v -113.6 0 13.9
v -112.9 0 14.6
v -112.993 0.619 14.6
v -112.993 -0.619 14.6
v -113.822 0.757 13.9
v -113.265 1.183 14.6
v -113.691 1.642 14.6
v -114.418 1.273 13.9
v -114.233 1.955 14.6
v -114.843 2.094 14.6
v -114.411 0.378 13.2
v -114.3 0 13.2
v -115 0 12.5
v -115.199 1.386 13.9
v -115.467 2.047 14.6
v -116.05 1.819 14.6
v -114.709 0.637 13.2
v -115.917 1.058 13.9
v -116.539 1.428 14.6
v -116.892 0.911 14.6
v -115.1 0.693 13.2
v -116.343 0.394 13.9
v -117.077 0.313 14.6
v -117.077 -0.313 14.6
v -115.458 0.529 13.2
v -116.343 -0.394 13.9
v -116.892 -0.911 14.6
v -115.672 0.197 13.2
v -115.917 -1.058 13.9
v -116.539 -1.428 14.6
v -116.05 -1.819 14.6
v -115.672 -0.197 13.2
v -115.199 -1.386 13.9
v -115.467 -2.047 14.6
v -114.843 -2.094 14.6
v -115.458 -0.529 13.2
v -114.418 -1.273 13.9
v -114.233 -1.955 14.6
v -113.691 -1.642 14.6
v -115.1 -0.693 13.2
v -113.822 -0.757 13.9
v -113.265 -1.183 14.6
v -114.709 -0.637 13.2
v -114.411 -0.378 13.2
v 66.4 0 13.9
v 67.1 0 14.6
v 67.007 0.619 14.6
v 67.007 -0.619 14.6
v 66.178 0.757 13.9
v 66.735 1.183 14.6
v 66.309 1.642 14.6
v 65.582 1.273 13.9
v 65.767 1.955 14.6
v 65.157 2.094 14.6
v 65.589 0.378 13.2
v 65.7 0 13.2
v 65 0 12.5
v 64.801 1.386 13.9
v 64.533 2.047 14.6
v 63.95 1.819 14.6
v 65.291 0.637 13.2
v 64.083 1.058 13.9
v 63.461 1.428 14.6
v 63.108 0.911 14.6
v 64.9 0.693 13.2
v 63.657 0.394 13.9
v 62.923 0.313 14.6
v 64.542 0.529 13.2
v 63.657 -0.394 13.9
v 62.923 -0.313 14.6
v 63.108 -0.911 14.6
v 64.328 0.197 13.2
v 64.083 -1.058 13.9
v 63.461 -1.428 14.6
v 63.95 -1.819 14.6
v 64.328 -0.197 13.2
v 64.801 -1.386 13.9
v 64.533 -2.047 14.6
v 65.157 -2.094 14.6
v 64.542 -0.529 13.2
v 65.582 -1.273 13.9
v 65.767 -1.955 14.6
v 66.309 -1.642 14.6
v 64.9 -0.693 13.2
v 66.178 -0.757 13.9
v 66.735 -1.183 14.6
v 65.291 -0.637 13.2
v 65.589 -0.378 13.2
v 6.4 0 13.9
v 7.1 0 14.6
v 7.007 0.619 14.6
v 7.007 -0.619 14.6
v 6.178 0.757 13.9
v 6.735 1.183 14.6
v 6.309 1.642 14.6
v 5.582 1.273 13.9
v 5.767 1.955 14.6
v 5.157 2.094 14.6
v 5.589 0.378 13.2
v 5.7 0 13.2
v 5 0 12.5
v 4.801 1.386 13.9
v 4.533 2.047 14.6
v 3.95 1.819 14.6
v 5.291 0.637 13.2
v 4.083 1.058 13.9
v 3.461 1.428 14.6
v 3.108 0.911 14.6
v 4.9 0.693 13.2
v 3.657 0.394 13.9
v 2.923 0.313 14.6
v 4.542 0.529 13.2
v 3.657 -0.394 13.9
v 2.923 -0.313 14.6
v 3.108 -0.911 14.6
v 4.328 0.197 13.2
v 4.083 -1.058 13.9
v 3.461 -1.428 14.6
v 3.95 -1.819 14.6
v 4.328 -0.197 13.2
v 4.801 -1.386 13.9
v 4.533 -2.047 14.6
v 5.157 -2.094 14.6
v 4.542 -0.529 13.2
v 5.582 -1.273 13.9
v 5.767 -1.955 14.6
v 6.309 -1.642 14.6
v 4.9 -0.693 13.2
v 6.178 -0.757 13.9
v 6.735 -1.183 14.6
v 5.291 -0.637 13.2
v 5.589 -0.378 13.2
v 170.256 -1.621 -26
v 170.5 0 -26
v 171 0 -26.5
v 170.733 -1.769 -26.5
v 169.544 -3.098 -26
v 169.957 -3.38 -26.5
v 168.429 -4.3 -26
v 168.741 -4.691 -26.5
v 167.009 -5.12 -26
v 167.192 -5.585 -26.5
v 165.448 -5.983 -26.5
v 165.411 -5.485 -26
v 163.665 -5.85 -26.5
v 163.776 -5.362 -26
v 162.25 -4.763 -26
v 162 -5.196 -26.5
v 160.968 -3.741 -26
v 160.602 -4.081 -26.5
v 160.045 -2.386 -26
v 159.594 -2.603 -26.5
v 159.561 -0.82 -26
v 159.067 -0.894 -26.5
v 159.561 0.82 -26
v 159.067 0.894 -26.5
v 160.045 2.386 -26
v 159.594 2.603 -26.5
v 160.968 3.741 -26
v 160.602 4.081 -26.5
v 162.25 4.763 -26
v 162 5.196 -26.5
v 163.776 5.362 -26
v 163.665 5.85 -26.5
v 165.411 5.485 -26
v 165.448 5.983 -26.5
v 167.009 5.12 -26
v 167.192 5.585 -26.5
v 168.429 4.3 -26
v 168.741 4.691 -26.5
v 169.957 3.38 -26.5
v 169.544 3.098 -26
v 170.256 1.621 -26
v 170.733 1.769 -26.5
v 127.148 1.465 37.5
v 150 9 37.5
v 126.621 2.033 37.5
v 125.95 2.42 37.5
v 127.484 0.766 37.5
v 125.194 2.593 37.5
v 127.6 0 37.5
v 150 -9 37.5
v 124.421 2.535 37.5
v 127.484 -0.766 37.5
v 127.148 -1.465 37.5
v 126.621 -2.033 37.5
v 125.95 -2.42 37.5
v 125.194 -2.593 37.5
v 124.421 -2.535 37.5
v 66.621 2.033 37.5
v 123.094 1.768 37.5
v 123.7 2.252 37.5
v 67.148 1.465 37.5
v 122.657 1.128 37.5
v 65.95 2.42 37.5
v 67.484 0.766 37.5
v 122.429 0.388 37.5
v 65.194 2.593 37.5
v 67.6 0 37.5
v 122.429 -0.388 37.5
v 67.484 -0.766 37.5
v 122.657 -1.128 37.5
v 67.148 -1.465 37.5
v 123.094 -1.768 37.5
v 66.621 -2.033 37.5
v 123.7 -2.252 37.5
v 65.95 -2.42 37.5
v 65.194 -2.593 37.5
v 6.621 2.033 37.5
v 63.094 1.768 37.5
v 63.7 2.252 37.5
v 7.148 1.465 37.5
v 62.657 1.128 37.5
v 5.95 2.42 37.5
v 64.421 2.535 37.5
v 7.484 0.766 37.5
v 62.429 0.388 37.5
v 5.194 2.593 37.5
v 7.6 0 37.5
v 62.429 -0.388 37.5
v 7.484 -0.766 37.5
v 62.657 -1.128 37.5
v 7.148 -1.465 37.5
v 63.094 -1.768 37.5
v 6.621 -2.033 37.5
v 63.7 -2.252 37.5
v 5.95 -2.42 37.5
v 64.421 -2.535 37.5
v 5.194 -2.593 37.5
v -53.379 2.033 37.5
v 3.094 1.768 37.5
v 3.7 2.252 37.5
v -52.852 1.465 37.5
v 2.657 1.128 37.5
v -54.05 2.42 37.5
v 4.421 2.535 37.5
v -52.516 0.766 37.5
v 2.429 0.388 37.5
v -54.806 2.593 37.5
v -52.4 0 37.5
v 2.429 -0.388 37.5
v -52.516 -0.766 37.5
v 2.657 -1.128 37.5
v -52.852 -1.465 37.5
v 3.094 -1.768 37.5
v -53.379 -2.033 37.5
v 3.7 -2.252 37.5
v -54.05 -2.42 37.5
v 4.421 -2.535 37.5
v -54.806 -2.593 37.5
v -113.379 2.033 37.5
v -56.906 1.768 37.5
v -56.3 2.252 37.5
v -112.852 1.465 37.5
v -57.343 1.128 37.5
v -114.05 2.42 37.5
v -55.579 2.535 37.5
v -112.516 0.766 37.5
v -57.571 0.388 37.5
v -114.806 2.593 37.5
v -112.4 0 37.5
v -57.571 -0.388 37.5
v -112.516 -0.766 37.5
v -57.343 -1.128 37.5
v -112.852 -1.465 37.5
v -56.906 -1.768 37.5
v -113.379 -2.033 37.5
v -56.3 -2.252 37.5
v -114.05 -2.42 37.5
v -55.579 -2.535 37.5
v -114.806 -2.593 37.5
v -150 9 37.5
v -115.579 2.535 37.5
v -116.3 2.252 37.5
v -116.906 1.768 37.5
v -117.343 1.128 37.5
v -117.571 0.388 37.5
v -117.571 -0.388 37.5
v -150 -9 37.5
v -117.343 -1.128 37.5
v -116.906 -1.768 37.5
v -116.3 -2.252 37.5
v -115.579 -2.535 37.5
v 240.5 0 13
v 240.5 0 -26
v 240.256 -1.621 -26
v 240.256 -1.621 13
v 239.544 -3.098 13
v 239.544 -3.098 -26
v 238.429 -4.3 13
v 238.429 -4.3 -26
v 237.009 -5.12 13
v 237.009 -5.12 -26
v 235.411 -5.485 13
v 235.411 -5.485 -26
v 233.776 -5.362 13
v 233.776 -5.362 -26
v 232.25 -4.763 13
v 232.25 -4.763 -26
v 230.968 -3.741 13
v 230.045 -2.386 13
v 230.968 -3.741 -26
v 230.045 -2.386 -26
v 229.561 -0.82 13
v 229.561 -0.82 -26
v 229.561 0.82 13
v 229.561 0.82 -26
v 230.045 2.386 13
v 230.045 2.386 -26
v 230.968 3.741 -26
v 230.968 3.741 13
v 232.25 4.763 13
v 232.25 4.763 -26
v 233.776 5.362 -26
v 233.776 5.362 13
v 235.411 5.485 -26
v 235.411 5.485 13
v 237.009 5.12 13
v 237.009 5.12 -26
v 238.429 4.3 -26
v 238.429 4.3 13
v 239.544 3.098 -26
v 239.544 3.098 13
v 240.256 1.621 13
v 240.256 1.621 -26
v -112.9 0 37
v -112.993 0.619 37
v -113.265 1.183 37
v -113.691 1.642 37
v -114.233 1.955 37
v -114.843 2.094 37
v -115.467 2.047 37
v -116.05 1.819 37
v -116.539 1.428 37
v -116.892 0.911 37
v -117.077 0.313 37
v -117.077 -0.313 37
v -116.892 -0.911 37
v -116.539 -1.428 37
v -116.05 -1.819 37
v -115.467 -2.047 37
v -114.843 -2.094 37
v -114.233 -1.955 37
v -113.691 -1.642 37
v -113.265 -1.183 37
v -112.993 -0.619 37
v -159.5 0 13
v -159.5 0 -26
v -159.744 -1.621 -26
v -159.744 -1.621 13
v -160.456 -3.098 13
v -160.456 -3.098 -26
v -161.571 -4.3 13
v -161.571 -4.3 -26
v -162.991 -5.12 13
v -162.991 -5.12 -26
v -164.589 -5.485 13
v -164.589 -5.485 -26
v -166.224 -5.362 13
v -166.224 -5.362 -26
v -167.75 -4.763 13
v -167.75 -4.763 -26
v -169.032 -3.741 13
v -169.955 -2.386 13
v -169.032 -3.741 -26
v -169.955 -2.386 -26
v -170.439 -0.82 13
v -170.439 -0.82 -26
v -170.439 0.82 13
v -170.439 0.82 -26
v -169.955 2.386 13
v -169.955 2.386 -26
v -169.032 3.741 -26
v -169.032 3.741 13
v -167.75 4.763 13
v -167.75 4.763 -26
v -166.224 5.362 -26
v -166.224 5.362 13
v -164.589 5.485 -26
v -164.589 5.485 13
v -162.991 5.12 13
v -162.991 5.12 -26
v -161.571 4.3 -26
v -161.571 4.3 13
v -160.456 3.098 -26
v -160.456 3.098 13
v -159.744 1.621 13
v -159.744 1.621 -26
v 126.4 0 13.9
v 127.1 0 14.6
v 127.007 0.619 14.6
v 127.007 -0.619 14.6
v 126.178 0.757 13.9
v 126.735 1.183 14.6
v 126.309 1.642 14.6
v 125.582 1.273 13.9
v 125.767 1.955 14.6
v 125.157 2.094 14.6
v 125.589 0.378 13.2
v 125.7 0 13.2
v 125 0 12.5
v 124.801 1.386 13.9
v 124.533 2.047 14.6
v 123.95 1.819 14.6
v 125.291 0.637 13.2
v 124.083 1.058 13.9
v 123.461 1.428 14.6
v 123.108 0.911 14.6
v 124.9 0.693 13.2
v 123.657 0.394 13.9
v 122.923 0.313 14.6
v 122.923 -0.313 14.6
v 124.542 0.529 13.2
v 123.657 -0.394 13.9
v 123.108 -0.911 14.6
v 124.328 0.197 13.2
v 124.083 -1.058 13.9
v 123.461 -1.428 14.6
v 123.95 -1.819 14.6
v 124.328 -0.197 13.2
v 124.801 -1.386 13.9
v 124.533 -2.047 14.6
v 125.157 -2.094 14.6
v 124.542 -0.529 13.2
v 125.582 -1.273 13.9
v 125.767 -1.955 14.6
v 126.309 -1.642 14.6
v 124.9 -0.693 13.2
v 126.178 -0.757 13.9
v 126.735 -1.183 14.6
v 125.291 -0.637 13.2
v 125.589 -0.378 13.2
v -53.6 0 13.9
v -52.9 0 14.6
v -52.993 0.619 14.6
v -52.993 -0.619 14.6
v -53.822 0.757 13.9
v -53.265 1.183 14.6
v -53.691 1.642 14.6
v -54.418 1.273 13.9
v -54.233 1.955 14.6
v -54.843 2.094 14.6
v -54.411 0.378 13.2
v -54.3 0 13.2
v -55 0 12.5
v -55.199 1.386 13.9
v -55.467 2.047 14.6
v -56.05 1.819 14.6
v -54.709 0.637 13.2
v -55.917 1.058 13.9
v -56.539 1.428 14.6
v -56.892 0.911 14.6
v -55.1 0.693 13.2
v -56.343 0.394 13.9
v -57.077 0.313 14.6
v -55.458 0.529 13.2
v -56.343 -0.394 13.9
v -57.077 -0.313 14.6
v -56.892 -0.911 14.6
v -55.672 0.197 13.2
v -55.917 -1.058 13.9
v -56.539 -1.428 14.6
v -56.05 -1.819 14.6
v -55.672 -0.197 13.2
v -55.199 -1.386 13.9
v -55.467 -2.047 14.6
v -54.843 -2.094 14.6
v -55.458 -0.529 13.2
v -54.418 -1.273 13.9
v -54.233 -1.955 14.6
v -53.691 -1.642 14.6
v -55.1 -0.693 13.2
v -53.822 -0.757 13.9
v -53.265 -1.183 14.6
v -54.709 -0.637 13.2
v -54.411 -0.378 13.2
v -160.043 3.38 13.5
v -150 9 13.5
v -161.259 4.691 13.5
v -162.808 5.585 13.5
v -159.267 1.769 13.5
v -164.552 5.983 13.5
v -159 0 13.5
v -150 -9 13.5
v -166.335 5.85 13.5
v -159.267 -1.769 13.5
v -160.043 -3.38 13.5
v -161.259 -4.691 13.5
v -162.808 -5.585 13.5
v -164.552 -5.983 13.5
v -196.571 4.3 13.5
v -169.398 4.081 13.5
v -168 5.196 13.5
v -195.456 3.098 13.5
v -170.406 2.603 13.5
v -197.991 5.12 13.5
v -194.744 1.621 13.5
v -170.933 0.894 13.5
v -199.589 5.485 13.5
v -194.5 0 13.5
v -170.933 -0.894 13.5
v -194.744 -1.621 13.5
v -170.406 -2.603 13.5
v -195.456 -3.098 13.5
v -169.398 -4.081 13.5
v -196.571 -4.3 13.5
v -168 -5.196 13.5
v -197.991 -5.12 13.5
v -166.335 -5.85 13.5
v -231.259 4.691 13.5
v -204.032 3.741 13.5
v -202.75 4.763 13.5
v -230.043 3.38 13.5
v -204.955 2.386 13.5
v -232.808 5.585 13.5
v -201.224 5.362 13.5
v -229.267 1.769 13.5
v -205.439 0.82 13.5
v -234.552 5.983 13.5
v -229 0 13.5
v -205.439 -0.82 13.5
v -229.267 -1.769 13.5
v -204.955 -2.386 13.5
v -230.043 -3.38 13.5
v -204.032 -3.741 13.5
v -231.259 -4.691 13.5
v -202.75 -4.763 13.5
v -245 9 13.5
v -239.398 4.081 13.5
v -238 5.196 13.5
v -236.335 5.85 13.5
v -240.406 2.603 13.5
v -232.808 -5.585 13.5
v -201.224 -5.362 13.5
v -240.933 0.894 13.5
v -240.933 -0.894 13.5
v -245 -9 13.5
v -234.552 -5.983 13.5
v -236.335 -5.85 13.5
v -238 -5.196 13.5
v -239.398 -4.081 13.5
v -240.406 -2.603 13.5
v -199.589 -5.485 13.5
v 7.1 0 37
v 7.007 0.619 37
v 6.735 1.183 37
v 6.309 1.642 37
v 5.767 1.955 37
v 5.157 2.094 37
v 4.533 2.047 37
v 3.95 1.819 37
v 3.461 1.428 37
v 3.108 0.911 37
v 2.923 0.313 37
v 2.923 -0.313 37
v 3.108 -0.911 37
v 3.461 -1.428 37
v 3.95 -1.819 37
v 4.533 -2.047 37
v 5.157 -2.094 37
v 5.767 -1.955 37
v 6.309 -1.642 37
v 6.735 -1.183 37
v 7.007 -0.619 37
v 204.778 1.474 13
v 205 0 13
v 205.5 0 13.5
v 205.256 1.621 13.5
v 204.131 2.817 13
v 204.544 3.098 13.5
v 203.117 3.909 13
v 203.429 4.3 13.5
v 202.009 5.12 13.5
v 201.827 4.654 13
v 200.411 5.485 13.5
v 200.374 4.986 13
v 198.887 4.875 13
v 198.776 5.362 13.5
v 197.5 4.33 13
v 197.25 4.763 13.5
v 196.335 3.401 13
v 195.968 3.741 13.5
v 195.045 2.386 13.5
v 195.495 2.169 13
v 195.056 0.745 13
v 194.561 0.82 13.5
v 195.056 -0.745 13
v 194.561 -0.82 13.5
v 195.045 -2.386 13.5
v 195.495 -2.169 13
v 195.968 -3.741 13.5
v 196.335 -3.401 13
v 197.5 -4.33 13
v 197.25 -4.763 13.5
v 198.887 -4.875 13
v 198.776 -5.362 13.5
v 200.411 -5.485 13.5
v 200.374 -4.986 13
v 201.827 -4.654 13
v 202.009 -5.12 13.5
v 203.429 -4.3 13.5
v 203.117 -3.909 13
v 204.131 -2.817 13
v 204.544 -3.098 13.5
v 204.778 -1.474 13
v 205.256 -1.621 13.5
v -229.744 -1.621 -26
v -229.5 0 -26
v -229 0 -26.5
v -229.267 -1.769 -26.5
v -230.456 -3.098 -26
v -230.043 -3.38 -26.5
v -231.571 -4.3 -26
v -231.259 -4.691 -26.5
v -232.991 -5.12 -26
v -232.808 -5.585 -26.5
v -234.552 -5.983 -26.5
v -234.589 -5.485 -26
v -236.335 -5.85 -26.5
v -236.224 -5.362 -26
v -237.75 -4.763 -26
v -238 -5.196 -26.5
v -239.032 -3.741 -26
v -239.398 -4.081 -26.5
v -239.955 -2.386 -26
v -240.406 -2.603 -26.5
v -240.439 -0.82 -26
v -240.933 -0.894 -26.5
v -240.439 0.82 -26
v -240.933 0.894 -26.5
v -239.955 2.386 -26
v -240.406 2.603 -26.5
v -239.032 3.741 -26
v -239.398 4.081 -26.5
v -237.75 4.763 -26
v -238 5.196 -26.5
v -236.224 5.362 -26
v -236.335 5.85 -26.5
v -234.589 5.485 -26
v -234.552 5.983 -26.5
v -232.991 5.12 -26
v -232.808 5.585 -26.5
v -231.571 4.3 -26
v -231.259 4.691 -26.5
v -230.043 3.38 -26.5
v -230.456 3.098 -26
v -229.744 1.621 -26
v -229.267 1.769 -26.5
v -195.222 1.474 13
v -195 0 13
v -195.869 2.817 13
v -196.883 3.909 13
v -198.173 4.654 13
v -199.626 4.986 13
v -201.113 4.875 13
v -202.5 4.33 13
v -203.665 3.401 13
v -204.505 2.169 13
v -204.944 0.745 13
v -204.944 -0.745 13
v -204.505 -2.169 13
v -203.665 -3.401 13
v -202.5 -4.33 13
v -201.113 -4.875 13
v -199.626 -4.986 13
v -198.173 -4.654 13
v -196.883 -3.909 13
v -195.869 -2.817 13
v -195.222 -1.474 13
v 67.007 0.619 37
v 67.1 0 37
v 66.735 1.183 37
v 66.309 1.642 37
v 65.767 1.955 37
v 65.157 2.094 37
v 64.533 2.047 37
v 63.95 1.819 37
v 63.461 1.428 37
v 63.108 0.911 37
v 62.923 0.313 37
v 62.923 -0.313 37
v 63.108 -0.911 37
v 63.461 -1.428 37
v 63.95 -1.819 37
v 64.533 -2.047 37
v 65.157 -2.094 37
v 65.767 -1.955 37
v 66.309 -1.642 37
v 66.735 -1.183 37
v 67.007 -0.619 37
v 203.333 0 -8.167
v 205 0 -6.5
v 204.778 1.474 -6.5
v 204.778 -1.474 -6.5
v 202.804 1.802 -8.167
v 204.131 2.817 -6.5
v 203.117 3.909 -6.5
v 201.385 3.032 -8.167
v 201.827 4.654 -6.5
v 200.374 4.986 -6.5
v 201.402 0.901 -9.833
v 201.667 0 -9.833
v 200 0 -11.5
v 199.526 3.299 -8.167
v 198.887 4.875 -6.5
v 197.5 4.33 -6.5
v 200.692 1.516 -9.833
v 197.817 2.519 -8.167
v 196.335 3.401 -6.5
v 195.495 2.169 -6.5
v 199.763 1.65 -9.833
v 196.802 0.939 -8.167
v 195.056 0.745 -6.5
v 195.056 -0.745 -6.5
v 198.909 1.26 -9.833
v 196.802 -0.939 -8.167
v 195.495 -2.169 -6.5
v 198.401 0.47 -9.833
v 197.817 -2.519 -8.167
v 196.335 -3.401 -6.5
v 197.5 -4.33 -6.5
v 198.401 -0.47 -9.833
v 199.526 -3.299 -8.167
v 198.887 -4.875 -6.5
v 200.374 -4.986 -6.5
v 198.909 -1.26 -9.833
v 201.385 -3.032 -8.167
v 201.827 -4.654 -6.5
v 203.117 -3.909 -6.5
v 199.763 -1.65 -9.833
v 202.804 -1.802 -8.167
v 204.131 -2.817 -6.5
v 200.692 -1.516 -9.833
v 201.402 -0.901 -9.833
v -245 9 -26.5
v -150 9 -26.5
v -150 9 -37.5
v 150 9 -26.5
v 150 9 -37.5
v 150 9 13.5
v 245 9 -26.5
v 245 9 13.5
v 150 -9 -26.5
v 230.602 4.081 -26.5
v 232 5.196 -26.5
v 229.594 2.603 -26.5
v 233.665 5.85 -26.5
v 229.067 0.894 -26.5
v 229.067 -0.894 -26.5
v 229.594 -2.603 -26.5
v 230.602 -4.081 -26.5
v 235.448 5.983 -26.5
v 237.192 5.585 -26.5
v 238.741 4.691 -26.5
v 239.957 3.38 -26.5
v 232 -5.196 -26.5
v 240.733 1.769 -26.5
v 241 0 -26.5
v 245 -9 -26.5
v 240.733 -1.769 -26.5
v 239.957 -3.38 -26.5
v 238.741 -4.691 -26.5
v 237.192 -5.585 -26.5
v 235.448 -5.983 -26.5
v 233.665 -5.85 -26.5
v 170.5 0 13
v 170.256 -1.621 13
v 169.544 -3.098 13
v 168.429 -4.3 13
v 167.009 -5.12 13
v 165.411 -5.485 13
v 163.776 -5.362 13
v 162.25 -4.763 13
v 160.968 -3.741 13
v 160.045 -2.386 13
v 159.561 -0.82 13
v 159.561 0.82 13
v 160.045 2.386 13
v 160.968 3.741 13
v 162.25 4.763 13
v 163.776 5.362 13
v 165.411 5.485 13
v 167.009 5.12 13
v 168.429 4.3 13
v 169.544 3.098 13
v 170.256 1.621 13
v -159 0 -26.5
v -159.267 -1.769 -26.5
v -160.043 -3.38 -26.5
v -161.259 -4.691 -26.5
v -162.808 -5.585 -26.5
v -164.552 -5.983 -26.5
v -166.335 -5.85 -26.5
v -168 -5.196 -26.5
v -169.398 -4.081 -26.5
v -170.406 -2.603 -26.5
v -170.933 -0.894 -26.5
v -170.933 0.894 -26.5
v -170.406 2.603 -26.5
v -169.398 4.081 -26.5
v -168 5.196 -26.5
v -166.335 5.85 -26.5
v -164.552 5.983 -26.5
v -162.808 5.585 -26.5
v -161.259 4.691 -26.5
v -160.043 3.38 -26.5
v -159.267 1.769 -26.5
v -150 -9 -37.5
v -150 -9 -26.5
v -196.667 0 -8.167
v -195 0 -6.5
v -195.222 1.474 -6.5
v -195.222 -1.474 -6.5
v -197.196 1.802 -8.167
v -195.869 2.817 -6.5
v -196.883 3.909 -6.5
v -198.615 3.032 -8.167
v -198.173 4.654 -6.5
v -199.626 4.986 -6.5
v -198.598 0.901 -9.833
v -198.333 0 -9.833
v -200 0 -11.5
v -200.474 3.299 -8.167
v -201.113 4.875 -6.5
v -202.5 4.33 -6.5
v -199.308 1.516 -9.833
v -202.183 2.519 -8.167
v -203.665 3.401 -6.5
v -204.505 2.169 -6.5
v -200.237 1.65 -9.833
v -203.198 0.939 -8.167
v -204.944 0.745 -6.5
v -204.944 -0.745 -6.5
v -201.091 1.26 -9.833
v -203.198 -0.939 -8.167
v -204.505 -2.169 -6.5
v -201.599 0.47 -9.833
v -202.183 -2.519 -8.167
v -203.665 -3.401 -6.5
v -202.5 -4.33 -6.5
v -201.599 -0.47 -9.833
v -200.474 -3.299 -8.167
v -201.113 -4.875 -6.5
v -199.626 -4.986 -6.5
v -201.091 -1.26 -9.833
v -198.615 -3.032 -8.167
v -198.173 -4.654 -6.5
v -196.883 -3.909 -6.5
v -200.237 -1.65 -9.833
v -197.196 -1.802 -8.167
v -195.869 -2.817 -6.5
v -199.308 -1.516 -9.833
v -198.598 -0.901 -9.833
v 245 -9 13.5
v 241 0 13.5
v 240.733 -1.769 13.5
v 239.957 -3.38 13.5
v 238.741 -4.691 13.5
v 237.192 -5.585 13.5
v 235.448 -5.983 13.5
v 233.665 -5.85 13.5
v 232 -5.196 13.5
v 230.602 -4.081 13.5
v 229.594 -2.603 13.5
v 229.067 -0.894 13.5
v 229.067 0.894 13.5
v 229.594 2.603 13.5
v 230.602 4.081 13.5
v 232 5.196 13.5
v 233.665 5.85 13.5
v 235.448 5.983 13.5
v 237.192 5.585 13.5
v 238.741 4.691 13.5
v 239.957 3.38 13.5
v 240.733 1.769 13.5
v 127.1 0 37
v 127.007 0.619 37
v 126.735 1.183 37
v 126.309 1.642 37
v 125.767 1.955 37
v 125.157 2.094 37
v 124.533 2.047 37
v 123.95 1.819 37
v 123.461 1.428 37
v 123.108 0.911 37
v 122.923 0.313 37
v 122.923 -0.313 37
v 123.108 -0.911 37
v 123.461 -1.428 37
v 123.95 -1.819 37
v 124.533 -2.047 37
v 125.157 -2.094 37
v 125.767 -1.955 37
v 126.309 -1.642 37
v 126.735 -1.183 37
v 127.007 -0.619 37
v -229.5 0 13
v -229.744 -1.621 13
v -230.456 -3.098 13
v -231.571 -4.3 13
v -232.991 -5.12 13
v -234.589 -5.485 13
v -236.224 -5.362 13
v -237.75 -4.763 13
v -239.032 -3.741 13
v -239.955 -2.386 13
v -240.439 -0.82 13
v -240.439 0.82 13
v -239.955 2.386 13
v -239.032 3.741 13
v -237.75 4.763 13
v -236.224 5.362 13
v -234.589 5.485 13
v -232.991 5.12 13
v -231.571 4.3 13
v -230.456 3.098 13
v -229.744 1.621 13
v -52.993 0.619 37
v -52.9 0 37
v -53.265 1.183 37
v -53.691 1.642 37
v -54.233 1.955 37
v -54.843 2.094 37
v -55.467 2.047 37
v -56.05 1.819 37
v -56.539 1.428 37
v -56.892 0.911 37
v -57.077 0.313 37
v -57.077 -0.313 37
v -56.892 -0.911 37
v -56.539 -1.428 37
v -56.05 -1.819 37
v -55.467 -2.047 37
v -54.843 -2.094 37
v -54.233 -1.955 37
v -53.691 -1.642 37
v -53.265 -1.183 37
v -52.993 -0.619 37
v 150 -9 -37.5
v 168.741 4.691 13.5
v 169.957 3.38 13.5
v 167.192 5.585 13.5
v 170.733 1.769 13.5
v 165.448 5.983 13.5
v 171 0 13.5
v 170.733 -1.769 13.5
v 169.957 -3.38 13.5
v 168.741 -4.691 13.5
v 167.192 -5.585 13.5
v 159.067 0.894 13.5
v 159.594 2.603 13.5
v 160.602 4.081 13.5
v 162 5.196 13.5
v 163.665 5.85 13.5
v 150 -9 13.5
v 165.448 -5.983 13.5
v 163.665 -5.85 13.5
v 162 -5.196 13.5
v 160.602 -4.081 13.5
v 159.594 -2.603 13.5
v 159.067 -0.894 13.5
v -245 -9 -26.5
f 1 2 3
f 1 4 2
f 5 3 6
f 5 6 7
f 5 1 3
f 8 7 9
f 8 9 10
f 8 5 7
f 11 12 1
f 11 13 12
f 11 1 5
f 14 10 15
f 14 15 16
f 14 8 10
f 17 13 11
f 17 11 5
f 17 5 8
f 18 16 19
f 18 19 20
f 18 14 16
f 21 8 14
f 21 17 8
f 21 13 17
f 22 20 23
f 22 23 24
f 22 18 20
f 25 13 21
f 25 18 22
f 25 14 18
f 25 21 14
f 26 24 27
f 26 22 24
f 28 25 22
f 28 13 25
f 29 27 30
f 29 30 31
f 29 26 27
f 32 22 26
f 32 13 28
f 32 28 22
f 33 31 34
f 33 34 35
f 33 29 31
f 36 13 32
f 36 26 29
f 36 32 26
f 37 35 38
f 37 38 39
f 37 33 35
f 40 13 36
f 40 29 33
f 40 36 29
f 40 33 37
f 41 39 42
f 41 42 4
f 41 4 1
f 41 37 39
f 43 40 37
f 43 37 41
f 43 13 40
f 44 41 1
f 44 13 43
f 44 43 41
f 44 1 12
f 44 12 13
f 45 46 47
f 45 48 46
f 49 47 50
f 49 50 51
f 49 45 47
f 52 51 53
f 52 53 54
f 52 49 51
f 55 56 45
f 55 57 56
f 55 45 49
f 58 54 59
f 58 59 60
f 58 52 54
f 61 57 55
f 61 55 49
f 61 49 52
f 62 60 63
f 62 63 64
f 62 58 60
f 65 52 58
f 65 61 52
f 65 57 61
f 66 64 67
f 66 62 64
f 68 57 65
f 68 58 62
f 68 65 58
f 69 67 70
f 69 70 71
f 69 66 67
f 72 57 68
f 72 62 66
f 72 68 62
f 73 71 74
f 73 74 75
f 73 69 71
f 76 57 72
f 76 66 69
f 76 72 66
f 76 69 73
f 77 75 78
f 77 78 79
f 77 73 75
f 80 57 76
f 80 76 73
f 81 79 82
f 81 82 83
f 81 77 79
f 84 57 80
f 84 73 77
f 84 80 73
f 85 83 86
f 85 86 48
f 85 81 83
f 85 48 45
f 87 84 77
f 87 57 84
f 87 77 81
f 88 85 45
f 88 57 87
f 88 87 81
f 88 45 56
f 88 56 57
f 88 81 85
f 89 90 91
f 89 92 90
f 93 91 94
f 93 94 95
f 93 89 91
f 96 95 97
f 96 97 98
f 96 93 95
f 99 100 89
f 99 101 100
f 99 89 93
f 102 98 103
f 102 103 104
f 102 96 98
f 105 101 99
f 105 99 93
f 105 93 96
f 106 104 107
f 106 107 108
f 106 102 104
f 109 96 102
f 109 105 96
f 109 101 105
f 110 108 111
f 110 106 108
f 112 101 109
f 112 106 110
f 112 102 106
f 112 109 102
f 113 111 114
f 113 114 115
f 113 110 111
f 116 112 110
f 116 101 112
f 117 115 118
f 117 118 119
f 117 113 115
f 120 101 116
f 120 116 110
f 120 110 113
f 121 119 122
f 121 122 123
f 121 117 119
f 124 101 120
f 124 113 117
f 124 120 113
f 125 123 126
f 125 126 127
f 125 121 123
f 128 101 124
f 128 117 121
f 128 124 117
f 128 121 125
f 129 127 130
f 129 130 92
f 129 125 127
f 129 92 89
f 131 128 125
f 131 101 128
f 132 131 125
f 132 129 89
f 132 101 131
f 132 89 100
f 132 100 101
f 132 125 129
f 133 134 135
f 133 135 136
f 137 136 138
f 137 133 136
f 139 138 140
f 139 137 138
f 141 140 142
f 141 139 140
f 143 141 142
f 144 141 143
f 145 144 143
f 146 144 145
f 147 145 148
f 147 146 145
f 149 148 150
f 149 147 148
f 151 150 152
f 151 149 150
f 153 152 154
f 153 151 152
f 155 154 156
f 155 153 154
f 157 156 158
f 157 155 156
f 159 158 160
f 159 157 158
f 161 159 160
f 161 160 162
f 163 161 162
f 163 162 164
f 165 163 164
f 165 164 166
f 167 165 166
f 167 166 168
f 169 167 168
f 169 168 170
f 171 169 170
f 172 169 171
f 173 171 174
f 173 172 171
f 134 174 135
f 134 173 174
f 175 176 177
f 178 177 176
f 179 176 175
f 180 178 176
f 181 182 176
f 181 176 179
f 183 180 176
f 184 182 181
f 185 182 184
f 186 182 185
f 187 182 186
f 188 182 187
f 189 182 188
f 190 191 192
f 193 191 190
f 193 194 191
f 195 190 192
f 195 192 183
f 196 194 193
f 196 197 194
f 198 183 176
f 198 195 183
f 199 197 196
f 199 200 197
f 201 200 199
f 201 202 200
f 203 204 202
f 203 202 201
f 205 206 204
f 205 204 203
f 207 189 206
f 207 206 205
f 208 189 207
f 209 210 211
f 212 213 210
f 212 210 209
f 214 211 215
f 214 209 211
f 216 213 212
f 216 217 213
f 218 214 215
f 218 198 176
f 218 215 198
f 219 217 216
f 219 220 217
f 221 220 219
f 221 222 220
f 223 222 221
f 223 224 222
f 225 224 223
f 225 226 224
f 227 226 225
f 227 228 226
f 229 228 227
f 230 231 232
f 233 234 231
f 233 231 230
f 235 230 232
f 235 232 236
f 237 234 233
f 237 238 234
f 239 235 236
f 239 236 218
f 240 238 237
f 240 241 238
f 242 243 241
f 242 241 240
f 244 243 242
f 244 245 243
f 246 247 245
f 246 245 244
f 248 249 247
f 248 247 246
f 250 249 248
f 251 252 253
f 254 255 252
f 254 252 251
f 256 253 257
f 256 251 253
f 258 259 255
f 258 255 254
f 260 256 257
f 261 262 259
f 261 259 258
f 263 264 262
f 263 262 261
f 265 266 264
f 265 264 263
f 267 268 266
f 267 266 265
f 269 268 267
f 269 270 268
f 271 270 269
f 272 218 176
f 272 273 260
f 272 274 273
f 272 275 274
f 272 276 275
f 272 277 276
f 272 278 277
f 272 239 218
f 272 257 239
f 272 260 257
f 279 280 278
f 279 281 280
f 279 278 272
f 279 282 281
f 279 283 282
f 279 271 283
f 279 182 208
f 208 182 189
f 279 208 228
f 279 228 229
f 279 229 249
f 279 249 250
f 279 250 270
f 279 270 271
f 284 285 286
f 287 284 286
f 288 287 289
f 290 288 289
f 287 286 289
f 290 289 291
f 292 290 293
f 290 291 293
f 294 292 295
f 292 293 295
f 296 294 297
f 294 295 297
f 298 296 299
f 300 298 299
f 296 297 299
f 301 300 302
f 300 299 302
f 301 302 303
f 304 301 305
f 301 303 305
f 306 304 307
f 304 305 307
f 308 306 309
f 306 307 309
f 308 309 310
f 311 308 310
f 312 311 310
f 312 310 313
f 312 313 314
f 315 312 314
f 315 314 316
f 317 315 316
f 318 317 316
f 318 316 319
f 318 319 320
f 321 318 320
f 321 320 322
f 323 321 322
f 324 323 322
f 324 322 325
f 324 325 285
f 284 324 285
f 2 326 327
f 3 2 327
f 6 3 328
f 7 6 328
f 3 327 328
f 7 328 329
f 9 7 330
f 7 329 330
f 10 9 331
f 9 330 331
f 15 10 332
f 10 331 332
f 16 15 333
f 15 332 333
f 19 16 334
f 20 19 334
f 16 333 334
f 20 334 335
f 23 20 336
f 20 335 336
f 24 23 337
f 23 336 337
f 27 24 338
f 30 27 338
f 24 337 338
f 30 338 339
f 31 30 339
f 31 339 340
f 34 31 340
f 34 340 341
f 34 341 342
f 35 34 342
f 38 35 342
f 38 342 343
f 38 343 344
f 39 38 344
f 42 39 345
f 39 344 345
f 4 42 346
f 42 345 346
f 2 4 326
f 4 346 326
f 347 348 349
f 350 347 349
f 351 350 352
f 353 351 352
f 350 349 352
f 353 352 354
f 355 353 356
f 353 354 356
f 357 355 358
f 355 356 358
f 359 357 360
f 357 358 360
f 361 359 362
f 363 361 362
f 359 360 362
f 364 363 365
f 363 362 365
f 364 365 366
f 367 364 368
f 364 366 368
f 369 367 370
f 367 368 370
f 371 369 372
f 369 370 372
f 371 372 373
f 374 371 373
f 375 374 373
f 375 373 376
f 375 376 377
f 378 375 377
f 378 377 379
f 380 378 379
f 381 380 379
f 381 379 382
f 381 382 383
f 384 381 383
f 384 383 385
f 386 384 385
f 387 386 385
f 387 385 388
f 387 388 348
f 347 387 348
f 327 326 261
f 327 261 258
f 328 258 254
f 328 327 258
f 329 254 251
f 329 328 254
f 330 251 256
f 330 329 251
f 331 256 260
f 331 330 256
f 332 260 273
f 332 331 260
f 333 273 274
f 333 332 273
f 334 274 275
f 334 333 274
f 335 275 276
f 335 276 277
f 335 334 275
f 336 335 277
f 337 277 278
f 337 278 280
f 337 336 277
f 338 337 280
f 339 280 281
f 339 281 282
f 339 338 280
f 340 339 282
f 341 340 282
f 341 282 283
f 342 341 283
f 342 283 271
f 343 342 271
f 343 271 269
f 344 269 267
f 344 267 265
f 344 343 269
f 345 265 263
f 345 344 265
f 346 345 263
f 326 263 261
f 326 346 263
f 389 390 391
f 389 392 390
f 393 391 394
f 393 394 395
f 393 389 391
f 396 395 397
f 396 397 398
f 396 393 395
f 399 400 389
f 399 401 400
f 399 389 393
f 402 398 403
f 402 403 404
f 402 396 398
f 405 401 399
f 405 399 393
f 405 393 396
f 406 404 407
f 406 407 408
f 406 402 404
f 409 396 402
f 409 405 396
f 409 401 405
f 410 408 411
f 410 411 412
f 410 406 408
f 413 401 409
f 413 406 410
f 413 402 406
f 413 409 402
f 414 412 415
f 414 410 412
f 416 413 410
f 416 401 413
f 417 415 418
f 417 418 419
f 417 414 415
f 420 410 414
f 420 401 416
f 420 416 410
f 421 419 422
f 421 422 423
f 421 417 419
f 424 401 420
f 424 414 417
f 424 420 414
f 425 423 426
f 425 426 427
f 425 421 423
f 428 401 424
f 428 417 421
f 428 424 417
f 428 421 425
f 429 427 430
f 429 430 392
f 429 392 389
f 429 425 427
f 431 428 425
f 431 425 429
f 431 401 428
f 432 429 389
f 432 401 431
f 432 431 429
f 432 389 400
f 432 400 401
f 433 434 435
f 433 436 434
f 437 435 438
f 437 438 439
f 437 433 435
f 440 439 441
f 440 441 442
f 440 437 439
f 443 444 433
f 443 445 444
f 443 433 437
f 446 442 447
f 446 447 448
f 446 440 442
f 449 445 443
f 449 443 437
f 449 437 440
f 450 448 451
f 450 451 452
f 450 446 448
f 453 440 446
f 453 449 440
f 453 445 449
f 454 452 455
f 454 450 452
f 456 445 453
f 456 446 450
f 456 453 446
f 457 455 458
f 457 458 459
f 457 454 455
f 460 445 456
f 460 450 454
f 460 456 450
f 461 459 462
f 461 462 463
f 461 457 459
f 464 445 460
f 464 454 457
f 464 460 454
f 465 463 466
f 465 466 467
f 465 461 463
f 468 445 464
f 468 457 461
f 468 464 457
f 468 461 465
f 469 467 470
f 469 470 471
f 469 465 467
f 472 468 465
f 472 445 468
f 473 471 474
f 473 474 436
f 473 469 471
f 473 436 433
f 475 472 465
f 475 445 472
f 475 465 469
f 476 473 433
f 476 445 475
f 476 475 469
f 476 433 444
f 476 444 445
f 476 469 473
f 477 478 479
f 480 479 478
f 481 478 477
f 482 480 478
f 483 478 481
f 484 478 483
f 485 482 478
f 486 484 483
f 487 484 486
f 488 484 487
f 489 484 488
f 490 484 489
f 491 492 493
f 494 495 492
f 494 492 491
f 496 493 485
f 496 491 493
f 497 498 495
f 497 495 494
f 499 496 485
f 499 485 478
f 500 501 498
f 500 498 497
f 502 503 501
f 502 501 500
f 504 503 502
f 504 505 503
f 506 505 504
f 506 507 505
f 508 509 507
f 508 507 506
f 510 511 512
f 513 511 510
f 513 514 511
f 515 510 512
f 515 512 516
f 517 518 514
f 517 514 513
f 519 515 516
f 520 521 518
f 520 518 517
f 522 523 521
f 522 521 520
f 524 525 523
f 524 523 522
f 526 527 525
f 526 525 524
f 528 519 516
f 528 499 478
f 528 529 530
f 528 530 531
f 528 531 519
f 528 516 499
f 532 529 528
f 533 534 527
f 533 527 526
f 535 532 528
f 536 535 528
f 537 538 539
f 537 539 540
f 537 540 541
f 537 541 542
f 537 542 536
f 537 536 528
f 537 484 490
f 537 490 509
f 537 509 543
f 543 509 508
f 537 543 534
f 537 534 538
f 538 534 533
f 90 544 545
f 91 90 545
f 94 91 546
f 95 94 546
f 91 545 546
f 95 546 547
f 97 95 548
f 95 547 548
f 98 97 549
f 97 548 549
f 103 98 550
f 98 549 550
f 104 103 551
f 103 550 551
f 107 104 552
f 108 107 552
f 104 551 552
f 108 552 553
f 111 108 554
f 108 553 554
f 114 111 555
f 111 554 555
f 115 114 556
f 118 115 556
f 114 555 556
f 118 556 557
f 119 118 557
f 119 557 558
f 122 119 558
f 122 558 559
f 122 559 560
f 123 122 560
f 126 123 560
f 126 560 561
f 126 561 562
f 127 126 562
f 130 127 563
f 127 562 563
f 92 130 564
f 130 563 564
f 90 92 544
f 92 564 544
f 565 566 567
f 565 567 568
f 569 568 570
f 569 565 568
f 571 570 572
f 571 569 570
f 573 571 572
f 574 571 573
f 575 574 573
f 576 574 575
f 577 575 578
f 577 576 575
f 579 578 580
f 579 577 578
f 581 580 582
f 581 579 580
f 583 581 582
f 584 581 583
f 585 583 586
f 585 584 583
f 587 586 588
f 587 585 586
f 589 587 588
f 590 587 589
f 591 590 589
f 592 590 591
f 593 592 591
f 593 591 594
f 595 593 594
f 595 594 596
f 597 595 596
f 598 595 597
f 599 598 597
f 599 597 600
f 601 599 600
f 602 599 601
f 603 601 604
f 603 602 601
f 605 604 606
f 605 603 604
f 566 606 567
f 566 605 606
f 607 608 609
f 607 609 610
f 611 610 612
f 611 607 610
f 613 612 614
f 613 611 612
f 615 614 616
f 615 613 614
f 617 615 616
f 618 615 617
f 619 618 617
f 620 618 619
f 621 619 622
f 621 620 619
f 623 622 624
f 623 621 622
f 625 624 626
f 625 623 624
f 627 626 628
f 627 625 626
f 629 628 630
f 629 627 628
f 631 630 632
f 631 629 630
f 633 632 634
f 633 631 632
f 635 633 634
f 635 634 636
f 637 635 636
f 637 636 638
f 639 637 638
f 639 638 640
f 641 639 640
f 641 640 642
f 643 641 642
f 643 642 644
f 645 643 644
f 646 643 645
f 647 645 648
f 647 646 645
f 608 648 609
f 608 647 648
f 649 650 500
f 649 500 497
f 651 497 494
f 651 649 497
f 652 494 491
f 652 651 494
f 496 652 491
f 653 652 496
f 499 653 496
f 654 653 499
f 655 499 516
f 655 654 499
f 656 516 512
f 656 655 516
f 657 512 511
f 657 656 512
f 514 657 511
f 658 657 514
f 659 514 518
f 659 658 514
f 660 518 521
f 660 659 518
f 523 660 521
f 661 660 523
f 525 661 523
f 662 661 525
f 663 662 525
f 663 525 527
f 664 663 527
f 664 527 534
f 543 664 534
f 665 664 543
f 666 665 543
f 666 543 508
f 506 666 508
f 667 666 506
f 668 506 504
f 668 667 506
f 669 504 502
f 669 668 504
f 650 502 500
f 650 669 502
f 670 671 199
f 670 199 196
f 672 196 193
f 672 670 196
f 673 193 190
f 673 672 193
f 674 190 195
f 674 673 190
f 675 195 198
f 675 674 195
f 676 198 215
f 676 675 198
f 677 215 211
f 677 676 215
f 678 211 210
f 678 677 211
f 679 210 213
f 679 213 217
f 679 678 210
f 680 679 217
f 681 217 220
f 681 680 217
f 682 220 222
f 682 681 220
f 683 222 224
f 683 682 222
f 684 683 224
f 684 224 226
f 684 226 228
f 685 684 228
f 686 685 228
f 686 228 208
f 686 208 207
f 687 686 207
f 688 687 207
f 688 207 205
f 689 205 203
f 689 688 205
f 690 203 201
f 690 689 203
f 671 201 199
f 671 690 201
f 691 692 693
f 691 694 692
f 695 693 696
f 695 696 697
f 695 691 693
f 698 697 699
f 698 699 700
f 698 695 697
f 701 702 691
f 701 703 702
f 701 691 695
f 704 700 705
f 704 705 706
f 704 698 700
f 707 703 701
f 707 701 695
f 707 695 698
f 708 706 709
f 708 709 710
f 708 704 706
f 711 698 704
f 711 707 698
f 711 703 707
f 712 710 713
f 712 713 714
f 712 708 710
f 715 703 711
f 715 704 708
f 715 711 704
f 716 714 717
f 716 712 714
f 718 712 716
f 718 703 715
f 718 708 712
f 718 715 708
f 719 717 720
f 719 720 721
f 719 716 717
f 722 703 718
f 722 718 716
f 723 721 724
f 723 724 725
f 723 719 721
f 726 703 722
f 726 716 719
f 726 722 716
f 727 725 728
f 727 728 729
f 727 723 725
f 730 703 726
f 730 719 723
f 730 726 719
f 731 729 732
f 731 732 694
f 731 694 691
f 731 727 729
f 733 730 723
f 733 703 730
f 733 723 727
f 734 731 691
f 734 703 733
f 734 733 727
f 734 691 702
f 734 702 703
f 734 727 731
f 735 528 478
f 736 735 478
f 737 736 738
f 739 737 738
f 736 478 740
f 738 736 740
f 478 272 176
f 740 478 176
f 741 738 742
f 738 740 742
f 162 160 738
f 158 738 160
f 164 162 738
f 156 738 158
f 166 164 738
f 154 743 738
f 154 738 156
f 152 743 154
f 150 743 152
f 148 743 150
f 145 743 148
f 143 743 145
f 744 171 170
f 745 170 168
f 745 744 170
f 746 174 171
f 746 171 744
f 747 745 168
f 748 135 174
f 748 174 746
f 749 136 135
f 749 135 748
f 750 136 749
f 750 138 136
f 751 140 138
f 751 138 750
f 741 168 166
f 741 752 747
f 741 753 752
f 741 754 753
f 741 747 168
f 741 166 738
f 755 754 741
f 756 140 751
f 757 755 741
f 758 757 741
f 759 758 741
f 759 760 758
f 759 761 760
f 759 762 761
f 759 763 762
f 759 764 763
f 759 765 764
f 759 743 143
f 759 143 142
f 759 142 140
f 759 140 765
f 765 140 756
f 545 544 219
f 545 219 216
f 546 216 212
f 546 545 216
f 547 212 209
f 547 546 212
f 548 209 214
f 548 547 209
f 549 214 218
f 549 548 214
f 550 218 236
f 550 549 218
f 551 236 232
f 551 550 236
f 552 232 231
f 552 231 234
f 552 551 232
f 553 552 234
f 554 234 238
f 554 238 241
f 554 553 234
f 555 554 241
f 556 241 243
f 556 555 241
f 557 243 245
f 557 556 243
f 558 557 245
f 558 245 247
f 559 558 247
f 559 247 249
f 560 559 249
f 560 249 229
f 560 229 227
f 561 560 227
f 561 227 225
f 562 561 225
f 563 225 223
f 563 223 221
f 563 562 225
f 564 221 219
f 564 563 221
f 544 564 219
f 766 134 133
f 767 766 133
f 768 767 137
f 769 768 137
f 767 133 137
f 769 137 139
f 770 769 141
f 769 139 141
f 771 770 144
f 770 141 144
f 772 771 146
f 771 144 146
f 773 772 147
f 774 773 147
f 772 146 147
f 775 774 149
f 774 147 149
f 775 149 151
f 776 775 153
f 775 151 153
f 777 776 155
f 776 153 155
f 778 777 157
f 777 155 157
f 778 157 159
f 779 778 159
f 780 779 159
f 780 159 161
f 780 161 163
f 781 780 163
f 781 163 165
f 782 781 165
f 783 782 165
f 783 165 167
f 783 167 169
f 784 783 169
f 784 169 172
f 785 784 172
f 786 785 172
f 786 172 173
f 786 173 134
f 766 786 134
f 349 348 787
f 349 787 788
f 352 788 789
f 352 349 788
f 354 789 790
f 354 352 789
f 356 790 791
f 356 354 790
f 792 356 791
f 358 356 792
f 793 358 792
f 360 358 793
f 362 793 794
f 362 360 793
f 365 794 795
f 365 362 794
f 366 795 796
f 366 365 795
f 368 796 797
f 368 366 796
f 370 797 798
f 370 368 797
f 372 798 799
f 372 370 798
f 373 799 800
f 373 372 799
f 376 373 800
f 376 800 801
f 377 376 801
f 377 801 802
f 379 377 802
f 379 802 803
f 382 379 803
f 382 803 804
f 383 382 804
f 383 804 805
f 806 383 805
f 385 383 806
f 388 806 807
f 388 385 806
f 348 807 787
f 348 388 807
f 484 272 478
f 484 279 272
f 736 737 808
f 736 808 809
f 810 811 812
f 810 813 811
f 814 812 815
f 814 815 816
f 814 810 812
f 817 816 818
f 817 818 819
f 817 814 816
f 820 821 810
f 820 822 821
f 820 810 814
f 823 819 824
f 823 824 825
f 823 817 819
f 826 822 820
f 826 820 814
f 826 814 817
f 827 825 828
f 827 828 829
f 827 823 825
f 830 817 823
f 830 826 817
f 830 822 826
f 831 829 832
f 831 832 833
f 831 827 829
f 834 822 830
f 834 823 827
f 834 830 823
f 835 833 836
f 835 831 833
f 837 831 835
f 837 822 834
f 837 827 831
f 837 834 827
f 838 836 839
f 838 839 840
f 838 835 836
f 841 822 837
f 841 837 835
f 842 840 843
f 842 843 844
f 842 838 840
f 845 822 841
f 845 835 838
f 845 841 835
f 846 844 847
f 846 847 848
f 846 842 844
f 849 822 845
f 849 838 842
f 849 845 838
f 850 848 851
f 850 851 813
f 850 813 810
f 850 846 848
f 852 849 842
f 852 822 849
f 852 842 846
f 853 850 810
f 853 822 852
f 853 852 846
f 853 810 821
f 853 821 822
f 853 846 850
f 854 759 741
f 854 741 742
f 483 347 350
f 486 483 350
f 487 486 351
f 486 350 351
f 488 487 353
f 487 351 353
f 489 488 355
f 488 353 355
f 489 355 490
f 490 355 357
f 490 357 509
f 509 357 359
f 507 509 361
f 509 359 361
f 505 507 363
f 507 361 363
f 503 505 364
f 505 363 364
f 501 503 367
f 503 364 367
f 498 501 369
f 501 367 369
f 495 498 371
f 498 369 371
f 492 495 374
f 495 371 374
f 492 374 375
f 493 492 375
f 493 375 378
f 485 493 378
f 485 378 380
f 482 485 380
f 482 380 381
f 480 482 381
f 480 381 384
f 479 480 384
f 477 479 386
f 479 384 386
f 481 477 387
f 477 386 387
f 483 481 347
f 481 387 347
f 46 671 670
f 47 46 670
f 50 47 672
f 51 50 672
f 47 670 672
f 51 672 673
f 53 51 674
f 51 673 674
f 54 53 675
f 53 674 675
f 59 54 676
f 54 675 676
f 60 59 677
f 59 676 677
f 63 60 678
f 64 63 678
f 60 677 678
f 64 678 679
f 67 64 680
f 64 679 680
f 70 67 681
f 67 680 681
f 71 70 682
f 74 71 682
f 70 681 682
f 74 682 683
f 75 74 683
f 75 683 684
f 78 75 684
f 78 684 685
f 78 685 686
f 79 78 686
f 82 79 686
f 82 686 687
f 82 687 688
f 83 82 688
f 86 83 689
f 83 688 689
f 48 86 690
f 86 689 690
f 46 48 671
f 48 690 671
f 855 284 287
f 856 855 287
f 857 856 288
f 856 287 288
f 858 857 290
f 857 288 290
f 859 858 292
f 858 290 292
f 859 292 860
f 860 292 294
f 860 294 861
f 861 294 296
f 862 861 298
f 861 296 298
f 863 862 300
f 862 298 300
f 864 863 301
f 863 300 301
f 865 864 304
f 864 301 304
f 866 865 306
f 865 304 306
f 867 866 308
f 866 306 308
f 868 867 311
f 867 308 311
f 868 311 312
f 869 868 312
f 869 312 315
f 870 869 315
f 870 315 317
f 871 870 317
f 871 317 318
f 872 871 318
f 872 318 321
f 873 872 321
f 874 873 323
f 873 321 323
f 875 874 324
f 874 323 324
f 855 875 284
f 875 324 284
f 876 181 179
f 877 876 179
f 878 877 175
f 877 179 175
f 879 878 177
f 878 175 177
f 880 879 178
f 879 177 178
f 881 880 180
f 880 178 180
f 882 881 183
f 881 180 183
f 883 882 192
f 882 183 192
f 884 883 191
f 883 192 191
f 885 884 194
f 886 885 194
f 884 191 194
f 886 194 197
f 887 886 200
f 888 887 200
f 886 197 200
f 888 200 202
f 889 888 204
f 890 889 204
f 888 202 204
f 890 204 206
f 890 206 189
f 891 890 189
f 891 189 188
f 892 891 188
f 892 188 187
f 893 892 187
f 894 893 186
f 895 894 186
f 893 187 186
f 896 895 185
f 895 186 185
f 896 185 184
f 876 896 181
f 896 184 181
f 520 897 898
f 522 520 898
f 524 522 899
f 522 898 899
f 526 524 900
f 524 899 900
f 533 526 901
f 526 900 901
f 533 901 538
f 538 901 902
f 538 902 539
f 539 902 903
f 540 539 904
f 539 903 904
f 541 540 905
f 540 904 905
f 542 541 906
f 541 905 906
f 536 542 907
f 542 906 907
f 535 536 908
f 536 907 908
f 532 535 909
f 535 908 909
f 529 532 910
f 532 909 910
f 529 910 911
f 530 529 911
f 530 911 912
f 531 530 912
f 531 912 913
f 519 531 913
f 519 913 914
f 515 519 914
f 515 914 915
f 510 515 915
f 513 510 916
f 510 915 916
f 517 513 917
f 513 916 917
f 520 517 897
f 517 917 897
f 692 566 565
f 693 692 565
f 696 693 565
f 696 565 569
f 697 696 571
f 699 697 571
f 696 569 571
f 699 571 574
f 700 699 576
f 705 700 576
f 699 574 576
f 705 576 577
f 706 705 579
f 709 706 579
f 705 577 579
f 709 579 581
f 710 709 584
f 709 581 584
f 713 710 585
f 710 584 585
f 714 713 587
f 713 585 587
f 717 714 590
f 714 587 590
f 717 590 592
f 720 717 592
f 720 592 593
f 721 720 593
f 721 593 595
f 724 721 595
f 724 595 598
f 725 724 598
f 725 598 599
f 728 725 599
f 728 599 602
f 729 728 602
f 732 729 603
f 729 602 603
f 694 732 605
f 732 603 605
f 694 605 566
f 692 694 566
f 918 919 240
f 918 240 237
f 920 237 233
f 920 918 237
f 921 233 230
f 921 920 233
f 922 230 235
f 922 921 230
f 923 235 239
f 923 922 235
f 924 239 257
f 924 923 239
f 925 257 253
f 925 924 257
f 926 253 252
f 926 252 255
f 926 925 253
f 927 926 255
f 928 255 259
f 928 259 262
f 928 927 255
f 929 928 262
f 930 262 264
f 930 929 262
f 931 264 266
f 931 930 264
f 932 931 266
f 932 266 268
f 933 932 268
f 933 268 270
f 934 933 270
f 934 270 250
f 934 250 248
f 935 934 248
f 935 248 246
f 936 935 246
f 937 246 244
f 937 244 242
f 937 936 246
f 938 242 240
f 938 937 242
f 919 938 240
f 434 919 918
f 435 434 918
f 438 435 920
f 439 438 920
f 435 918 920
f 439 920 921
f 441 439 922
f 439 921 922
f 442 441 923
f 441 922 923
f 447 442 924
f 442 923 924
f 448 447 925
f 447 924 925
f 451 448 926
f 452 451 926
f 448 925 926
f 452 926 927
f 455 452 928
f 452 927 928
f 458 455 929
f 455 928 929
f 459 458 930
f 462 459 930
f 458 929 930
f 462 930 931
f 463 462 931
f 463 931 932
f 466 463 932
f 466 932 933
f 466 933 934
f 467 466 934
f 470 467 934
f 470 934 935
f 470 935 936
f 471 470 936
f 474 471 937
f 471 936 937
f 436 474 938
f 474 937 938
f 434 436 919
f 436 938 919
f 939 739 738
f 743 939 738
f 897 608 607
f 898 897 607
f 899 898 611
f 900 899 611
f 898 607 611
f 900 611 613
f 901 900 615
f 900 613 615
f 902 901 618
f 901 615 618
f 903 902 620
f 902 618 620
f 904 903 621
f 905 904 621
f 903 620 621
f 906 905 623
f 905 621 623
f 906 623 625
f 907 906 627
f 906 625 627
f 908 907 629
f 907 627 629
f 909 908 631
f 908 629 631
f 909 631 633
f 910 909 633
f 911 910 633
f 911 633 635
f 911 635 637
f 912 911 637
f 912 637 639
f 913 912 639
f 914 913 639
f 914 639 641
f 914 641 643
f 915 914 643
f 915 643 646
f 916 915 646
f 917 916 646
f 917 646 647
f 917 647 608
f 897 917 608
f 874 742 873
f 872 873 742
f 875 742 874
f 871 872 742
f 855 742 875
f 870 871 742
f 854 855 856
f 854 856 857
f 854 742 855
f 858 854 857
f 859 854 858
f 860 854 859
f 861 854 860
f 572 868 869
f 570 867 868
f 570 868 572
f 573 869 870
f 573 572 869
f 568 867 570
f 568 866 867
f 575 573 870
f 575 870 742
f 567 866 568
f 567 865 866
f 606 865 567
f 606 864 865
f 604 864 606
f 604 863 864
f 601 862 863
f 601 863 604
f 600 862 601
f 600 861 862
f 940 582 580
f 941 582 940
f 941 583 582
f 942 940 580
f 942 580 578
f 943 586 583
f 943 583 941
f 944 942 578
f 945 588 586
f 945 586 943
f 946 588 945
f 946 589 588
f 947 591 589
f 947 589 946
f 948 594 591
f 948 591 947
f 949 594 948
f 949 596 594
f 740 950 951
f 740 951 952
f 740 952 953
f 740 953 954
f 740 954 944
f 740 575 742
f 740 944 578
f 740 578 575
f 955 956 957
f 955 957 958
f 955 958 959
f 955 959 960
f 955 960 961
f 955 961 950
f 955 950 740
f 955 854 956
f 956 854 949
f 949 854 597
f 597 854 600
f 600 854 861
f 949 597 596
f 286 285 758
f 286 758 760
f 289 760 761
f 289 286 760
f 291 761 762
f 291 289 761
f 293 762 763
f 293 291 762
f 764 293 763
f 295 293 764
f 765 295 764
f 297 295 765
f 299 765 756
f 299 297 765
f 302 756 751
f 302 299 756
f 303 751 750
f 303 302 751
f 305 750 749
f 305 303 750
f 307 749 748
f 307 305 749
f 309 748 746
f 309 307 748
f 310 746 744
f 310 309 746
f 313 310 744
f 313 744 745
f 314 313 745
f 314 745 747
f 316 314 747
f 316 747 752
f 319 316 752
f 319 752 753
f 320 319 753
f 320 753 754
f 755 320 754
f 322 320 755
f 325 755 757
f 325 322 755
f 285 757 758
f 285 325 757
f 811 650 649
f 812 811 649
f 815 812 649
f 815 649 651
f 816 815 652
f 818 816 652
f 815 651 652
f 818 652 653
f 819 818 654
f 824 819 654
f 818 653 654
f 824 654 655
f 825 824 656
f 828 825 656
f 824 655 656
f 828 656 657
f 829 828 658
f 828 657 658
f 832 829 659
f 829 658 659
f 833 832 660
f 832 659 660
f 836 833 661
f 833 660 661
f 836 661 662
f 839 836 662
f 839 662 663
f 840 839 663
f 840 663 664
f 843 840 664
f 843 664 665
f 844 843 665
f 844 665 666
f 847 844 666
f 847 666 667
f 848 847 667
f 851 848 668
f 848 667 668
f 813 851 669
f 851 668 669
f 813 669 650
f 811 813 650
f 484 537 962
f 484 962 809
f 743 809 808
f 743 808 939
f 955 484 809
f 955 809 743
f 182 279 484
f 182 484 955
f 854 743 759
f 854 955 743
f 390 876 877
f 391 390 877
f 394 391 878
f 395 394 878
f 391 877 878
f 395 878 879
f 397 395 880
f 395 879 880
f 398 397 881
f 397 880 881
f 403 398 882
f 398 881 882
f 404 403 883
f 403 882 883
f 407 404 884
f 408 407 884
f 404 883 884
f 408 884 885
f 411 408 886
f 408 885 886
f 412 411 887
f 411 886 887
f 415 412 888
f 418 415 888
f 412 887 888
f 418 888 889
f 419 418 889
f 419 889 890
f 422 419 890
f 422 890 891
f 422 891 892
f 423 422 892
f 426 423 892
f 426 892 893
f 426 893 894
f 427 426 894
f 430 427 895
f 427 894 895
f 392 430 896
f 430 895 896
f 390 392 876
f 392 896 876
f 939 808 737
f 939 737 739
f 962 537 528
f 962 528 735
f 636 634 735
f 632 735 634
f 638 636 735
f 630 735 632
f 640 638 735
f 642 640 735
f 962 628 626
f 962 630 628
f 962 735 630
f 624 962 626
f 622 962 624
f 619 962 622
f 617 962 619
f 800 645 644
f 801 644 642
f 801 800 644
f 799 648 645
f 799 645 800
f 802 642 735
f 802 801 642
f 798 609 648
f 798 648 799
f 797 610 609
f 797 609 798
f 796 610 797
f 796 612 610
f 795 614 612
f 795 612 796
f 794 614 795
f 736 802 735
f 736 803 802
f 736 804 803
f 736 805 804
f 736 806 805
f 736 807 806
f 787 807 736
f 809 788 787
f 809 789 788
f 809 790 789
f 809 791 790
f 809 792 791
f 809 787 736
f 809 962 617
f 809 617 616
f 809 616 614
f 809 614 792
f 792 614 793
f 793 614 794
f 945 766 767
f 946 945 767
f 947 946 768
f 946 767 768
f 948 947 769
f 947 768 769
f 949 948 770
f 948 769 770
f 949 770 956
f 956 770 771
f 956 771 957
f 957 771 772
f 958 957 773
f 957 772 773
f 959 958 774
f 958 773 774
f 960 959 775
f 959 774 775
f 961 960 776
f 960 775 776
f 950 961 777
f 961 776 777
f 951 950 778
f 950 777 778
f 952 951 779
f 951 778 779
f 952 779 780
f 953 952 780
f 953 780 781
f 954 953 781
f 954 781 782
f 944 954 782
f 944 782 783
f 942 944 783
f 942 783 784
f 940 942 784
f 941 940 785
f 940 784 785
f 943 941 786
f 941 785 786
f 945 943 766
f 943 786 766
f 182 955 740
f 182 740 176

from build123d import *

# Parameters (mm, degrees)
F1_DEPTH = 9
F2_R     = 5.5
F3_DEPTH = 51
F4_R     = 2.1
F5_DEPTH = 25
F6_R     = 5
F7_DEPTH = 25
F8_W     = 95
F8_H     = 11
F9_DEPTH = 25
F10_SIZE = 5
F11_SIZE = 2.1
F12_SIZE = 0.5


with BuildPart() as f1:
    # F0 (on Front) → F1 (new body, symmetric)
    with BuildSketch(Plane.XZ):
        Polygon((-245, 13.5), (-245, -37.5), (245, -37.5), (245, 13.5), (150, 13.5), (150, 37.5), (-150, 37.5), (-150, 13.5), align=None)
    extrude(amount=F1_DEPTH, both=True)

    # F2 (on face) → F3 (cut, through all)
    with BuildSketch(Plane(origin=(0, 0, -37.5), x_dir=(1, 0, 0), z_dir=(0, 0, -1))):
        with Locations((235, 0)):
            Circle(F2_R)
        with Locations((165, 0)):
            Circle(F2_R)
        with Locations((-165, 0)):
            Circle(F2_R)
        with Locations((-235, 0)):
            Circle(F2_R)
    extrude(amount=-F3_DEPTH, mode=Mode.SUBTRACT)

    # F4 (on face) → F5 (cut)
    with BuildSketch(Plane.XY.offset(37.5)):
        with Locations((-115, 0)):
            Circle(F4_R)
        with Locations((-55, 0)):
            Circle(F4_R)
        with Locations((5, 0)):
            Circle(F4_R)
        with Locations((65, 0)):
            Circle(F4_R)
        with Locations((125, 0)):
            Circle(F4_R)
    extrude(amount=-F5_DEPTH, mode=Mode.SUBTRACT)

    # F6 (on face) → F7 (cut)
    with BuildSketch(Plane.XY.offset(13.5)):
        with Locations((-200, 0)):
            Circle(F6_R)
        with Locations((200, 0)):
            Circle(F6_R)
    extrude(amount=-F7_DEPTH, mode=Mode.SUBTRACT)

    # F8 (on face) → F9 (cut)
    with BuildSketch(Plane.XZ.offset(9)):
        with Locations((-197.5, -32)):
            Rectangle(F8_W, F8_H)
        with Locations((197.5, -32)):
            Rectangle(F8_W, F8_H)
    extrude(amount=-F9_DEPTH, mode=Mode.SUBTRACT)

    # F10
    f10_edges = [f1.edges().sort_by_distance(p)[0] for p in [
        (-205, 0, -11.5),
        (195, 0, -11.5),
    ]]
    chamfer(f10_edges, length=F10_SIZE)

    # F11
    f11_edges = [f1.edges().sort_by_distance(p)[0] for p in [
        (122.9, 0, 12.5),
        (62.9, 0, 12.5),
        (2.9, 0, 12.5),
        (-57.1, 0, 12.5),
        (-117.1, 0, 12.5),
    ]]
    chamfer(f11_edges, length=F11_SIZE)

    # F12
    f12_edges = [f1.edges().sort_by_distance(p)[0] for p in [
        (-170.5, 0, -26.5),
        (-159.5, 0, -6.5),
        (-170.5, 0, 13.5),
        (-240.5, 0, -26.5),
        (-229.5, 0, -6.5),
        (-240.5, 0, 13.5),
        (-205, 0, 13.5),
        (-117.1, 0, 37.5),
        (-57.1, 0, 37.5),
        (2.9, 0, 37.5),
        (62.9, 0, 37.5),
        (122.9, 0, 37.5),
        (159.5, 0, -26.5),
        (170.5, 0, -6.5),
        (159.5, 0, 13.5),
        (229.5, 0, -26.5),
        (240.5, 0, -6.5),
        (229.5, 0, 13.5),
        (195, 0, 13.5),
    ]]
    chamfer(f12_edges, length=F12_SIZE)


solid = f1.part
